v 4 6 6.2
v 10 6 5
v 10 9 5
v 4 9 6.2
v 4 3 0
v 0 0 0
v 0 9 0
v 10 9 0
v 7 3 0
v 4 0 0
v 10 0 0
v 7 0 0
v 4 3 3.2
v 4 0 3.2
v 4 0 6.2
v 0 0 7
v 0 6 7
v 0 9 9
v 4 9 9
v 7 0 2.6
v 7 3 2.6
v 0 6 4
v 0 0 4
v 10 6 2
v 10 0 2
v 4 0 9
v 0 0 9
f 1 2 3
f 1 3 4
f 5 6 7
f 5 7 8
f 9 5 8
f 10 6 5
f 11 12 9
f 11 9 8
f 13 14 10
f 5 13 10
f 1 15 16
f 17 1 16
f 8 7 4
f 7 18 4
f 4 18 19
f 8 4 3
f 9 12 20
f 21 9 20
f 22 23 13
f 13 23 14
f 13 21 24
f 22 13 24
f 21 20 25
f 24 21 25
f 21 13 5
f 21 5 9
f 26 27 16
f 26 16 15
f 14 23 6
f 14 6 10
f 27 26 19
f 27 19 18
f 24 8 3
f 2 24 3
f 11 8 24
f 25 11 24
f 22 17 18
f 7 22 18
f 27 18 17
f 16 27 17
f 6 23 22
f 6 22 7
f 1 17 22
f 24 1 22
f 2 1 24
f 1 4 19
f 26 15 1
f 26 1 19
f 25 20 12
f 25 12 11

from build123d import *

# Parameters (mm, degrees)
F1_DEPTH = 9
F2_DEPTH = 6
F3_DEPTH = 3


with BuildPart() as f1:
    # F0 (on Front) → F1 (new body)
    with BuildSketch(Plane.XZ):
        Polygon((0, 4), (0, 0), (4, 0), (4, 3.2), align=None)
        Polygon((7, 2.6), (7, 0), (10, 0), (10, 2), align=None)
        Polygon((0, 9), (0, 7), (4, 6.2), (4, 9), align=None)
        Polygon((4, 3.2), (4, 0), (7, 0), (7, 2.6), align=None)
        Polygon((0, 7), (0, 4), (4, 3.2), (7, 2.6), (10, 2), (10, 5), (4, 6.2), align=None)
    extrude(amount=-F1_DEPTH)

    # F0 (on Front) → F2 (cut)
    with BuildSketch(Plane.XZ):
        Polygon((0, 7), (0, 4), (4, 3.2), (7, 2.6), (10, 2), (10, 5), (4, 6.2), align=None)
    extrude(amount=-F2_DEPTH, mode=Mode.SUBTRACT)

    # F0 (on Front) → F3 (cut)
    with BuildSketch(Plane.XZ):
        Polygon((4, 3.2), (4, 0), (7, 0), (7, 2.6), align=None)
    extrude(amount=-F3_DEPTH, mode=Mode.SUBTRACT)


solid = f1.part
